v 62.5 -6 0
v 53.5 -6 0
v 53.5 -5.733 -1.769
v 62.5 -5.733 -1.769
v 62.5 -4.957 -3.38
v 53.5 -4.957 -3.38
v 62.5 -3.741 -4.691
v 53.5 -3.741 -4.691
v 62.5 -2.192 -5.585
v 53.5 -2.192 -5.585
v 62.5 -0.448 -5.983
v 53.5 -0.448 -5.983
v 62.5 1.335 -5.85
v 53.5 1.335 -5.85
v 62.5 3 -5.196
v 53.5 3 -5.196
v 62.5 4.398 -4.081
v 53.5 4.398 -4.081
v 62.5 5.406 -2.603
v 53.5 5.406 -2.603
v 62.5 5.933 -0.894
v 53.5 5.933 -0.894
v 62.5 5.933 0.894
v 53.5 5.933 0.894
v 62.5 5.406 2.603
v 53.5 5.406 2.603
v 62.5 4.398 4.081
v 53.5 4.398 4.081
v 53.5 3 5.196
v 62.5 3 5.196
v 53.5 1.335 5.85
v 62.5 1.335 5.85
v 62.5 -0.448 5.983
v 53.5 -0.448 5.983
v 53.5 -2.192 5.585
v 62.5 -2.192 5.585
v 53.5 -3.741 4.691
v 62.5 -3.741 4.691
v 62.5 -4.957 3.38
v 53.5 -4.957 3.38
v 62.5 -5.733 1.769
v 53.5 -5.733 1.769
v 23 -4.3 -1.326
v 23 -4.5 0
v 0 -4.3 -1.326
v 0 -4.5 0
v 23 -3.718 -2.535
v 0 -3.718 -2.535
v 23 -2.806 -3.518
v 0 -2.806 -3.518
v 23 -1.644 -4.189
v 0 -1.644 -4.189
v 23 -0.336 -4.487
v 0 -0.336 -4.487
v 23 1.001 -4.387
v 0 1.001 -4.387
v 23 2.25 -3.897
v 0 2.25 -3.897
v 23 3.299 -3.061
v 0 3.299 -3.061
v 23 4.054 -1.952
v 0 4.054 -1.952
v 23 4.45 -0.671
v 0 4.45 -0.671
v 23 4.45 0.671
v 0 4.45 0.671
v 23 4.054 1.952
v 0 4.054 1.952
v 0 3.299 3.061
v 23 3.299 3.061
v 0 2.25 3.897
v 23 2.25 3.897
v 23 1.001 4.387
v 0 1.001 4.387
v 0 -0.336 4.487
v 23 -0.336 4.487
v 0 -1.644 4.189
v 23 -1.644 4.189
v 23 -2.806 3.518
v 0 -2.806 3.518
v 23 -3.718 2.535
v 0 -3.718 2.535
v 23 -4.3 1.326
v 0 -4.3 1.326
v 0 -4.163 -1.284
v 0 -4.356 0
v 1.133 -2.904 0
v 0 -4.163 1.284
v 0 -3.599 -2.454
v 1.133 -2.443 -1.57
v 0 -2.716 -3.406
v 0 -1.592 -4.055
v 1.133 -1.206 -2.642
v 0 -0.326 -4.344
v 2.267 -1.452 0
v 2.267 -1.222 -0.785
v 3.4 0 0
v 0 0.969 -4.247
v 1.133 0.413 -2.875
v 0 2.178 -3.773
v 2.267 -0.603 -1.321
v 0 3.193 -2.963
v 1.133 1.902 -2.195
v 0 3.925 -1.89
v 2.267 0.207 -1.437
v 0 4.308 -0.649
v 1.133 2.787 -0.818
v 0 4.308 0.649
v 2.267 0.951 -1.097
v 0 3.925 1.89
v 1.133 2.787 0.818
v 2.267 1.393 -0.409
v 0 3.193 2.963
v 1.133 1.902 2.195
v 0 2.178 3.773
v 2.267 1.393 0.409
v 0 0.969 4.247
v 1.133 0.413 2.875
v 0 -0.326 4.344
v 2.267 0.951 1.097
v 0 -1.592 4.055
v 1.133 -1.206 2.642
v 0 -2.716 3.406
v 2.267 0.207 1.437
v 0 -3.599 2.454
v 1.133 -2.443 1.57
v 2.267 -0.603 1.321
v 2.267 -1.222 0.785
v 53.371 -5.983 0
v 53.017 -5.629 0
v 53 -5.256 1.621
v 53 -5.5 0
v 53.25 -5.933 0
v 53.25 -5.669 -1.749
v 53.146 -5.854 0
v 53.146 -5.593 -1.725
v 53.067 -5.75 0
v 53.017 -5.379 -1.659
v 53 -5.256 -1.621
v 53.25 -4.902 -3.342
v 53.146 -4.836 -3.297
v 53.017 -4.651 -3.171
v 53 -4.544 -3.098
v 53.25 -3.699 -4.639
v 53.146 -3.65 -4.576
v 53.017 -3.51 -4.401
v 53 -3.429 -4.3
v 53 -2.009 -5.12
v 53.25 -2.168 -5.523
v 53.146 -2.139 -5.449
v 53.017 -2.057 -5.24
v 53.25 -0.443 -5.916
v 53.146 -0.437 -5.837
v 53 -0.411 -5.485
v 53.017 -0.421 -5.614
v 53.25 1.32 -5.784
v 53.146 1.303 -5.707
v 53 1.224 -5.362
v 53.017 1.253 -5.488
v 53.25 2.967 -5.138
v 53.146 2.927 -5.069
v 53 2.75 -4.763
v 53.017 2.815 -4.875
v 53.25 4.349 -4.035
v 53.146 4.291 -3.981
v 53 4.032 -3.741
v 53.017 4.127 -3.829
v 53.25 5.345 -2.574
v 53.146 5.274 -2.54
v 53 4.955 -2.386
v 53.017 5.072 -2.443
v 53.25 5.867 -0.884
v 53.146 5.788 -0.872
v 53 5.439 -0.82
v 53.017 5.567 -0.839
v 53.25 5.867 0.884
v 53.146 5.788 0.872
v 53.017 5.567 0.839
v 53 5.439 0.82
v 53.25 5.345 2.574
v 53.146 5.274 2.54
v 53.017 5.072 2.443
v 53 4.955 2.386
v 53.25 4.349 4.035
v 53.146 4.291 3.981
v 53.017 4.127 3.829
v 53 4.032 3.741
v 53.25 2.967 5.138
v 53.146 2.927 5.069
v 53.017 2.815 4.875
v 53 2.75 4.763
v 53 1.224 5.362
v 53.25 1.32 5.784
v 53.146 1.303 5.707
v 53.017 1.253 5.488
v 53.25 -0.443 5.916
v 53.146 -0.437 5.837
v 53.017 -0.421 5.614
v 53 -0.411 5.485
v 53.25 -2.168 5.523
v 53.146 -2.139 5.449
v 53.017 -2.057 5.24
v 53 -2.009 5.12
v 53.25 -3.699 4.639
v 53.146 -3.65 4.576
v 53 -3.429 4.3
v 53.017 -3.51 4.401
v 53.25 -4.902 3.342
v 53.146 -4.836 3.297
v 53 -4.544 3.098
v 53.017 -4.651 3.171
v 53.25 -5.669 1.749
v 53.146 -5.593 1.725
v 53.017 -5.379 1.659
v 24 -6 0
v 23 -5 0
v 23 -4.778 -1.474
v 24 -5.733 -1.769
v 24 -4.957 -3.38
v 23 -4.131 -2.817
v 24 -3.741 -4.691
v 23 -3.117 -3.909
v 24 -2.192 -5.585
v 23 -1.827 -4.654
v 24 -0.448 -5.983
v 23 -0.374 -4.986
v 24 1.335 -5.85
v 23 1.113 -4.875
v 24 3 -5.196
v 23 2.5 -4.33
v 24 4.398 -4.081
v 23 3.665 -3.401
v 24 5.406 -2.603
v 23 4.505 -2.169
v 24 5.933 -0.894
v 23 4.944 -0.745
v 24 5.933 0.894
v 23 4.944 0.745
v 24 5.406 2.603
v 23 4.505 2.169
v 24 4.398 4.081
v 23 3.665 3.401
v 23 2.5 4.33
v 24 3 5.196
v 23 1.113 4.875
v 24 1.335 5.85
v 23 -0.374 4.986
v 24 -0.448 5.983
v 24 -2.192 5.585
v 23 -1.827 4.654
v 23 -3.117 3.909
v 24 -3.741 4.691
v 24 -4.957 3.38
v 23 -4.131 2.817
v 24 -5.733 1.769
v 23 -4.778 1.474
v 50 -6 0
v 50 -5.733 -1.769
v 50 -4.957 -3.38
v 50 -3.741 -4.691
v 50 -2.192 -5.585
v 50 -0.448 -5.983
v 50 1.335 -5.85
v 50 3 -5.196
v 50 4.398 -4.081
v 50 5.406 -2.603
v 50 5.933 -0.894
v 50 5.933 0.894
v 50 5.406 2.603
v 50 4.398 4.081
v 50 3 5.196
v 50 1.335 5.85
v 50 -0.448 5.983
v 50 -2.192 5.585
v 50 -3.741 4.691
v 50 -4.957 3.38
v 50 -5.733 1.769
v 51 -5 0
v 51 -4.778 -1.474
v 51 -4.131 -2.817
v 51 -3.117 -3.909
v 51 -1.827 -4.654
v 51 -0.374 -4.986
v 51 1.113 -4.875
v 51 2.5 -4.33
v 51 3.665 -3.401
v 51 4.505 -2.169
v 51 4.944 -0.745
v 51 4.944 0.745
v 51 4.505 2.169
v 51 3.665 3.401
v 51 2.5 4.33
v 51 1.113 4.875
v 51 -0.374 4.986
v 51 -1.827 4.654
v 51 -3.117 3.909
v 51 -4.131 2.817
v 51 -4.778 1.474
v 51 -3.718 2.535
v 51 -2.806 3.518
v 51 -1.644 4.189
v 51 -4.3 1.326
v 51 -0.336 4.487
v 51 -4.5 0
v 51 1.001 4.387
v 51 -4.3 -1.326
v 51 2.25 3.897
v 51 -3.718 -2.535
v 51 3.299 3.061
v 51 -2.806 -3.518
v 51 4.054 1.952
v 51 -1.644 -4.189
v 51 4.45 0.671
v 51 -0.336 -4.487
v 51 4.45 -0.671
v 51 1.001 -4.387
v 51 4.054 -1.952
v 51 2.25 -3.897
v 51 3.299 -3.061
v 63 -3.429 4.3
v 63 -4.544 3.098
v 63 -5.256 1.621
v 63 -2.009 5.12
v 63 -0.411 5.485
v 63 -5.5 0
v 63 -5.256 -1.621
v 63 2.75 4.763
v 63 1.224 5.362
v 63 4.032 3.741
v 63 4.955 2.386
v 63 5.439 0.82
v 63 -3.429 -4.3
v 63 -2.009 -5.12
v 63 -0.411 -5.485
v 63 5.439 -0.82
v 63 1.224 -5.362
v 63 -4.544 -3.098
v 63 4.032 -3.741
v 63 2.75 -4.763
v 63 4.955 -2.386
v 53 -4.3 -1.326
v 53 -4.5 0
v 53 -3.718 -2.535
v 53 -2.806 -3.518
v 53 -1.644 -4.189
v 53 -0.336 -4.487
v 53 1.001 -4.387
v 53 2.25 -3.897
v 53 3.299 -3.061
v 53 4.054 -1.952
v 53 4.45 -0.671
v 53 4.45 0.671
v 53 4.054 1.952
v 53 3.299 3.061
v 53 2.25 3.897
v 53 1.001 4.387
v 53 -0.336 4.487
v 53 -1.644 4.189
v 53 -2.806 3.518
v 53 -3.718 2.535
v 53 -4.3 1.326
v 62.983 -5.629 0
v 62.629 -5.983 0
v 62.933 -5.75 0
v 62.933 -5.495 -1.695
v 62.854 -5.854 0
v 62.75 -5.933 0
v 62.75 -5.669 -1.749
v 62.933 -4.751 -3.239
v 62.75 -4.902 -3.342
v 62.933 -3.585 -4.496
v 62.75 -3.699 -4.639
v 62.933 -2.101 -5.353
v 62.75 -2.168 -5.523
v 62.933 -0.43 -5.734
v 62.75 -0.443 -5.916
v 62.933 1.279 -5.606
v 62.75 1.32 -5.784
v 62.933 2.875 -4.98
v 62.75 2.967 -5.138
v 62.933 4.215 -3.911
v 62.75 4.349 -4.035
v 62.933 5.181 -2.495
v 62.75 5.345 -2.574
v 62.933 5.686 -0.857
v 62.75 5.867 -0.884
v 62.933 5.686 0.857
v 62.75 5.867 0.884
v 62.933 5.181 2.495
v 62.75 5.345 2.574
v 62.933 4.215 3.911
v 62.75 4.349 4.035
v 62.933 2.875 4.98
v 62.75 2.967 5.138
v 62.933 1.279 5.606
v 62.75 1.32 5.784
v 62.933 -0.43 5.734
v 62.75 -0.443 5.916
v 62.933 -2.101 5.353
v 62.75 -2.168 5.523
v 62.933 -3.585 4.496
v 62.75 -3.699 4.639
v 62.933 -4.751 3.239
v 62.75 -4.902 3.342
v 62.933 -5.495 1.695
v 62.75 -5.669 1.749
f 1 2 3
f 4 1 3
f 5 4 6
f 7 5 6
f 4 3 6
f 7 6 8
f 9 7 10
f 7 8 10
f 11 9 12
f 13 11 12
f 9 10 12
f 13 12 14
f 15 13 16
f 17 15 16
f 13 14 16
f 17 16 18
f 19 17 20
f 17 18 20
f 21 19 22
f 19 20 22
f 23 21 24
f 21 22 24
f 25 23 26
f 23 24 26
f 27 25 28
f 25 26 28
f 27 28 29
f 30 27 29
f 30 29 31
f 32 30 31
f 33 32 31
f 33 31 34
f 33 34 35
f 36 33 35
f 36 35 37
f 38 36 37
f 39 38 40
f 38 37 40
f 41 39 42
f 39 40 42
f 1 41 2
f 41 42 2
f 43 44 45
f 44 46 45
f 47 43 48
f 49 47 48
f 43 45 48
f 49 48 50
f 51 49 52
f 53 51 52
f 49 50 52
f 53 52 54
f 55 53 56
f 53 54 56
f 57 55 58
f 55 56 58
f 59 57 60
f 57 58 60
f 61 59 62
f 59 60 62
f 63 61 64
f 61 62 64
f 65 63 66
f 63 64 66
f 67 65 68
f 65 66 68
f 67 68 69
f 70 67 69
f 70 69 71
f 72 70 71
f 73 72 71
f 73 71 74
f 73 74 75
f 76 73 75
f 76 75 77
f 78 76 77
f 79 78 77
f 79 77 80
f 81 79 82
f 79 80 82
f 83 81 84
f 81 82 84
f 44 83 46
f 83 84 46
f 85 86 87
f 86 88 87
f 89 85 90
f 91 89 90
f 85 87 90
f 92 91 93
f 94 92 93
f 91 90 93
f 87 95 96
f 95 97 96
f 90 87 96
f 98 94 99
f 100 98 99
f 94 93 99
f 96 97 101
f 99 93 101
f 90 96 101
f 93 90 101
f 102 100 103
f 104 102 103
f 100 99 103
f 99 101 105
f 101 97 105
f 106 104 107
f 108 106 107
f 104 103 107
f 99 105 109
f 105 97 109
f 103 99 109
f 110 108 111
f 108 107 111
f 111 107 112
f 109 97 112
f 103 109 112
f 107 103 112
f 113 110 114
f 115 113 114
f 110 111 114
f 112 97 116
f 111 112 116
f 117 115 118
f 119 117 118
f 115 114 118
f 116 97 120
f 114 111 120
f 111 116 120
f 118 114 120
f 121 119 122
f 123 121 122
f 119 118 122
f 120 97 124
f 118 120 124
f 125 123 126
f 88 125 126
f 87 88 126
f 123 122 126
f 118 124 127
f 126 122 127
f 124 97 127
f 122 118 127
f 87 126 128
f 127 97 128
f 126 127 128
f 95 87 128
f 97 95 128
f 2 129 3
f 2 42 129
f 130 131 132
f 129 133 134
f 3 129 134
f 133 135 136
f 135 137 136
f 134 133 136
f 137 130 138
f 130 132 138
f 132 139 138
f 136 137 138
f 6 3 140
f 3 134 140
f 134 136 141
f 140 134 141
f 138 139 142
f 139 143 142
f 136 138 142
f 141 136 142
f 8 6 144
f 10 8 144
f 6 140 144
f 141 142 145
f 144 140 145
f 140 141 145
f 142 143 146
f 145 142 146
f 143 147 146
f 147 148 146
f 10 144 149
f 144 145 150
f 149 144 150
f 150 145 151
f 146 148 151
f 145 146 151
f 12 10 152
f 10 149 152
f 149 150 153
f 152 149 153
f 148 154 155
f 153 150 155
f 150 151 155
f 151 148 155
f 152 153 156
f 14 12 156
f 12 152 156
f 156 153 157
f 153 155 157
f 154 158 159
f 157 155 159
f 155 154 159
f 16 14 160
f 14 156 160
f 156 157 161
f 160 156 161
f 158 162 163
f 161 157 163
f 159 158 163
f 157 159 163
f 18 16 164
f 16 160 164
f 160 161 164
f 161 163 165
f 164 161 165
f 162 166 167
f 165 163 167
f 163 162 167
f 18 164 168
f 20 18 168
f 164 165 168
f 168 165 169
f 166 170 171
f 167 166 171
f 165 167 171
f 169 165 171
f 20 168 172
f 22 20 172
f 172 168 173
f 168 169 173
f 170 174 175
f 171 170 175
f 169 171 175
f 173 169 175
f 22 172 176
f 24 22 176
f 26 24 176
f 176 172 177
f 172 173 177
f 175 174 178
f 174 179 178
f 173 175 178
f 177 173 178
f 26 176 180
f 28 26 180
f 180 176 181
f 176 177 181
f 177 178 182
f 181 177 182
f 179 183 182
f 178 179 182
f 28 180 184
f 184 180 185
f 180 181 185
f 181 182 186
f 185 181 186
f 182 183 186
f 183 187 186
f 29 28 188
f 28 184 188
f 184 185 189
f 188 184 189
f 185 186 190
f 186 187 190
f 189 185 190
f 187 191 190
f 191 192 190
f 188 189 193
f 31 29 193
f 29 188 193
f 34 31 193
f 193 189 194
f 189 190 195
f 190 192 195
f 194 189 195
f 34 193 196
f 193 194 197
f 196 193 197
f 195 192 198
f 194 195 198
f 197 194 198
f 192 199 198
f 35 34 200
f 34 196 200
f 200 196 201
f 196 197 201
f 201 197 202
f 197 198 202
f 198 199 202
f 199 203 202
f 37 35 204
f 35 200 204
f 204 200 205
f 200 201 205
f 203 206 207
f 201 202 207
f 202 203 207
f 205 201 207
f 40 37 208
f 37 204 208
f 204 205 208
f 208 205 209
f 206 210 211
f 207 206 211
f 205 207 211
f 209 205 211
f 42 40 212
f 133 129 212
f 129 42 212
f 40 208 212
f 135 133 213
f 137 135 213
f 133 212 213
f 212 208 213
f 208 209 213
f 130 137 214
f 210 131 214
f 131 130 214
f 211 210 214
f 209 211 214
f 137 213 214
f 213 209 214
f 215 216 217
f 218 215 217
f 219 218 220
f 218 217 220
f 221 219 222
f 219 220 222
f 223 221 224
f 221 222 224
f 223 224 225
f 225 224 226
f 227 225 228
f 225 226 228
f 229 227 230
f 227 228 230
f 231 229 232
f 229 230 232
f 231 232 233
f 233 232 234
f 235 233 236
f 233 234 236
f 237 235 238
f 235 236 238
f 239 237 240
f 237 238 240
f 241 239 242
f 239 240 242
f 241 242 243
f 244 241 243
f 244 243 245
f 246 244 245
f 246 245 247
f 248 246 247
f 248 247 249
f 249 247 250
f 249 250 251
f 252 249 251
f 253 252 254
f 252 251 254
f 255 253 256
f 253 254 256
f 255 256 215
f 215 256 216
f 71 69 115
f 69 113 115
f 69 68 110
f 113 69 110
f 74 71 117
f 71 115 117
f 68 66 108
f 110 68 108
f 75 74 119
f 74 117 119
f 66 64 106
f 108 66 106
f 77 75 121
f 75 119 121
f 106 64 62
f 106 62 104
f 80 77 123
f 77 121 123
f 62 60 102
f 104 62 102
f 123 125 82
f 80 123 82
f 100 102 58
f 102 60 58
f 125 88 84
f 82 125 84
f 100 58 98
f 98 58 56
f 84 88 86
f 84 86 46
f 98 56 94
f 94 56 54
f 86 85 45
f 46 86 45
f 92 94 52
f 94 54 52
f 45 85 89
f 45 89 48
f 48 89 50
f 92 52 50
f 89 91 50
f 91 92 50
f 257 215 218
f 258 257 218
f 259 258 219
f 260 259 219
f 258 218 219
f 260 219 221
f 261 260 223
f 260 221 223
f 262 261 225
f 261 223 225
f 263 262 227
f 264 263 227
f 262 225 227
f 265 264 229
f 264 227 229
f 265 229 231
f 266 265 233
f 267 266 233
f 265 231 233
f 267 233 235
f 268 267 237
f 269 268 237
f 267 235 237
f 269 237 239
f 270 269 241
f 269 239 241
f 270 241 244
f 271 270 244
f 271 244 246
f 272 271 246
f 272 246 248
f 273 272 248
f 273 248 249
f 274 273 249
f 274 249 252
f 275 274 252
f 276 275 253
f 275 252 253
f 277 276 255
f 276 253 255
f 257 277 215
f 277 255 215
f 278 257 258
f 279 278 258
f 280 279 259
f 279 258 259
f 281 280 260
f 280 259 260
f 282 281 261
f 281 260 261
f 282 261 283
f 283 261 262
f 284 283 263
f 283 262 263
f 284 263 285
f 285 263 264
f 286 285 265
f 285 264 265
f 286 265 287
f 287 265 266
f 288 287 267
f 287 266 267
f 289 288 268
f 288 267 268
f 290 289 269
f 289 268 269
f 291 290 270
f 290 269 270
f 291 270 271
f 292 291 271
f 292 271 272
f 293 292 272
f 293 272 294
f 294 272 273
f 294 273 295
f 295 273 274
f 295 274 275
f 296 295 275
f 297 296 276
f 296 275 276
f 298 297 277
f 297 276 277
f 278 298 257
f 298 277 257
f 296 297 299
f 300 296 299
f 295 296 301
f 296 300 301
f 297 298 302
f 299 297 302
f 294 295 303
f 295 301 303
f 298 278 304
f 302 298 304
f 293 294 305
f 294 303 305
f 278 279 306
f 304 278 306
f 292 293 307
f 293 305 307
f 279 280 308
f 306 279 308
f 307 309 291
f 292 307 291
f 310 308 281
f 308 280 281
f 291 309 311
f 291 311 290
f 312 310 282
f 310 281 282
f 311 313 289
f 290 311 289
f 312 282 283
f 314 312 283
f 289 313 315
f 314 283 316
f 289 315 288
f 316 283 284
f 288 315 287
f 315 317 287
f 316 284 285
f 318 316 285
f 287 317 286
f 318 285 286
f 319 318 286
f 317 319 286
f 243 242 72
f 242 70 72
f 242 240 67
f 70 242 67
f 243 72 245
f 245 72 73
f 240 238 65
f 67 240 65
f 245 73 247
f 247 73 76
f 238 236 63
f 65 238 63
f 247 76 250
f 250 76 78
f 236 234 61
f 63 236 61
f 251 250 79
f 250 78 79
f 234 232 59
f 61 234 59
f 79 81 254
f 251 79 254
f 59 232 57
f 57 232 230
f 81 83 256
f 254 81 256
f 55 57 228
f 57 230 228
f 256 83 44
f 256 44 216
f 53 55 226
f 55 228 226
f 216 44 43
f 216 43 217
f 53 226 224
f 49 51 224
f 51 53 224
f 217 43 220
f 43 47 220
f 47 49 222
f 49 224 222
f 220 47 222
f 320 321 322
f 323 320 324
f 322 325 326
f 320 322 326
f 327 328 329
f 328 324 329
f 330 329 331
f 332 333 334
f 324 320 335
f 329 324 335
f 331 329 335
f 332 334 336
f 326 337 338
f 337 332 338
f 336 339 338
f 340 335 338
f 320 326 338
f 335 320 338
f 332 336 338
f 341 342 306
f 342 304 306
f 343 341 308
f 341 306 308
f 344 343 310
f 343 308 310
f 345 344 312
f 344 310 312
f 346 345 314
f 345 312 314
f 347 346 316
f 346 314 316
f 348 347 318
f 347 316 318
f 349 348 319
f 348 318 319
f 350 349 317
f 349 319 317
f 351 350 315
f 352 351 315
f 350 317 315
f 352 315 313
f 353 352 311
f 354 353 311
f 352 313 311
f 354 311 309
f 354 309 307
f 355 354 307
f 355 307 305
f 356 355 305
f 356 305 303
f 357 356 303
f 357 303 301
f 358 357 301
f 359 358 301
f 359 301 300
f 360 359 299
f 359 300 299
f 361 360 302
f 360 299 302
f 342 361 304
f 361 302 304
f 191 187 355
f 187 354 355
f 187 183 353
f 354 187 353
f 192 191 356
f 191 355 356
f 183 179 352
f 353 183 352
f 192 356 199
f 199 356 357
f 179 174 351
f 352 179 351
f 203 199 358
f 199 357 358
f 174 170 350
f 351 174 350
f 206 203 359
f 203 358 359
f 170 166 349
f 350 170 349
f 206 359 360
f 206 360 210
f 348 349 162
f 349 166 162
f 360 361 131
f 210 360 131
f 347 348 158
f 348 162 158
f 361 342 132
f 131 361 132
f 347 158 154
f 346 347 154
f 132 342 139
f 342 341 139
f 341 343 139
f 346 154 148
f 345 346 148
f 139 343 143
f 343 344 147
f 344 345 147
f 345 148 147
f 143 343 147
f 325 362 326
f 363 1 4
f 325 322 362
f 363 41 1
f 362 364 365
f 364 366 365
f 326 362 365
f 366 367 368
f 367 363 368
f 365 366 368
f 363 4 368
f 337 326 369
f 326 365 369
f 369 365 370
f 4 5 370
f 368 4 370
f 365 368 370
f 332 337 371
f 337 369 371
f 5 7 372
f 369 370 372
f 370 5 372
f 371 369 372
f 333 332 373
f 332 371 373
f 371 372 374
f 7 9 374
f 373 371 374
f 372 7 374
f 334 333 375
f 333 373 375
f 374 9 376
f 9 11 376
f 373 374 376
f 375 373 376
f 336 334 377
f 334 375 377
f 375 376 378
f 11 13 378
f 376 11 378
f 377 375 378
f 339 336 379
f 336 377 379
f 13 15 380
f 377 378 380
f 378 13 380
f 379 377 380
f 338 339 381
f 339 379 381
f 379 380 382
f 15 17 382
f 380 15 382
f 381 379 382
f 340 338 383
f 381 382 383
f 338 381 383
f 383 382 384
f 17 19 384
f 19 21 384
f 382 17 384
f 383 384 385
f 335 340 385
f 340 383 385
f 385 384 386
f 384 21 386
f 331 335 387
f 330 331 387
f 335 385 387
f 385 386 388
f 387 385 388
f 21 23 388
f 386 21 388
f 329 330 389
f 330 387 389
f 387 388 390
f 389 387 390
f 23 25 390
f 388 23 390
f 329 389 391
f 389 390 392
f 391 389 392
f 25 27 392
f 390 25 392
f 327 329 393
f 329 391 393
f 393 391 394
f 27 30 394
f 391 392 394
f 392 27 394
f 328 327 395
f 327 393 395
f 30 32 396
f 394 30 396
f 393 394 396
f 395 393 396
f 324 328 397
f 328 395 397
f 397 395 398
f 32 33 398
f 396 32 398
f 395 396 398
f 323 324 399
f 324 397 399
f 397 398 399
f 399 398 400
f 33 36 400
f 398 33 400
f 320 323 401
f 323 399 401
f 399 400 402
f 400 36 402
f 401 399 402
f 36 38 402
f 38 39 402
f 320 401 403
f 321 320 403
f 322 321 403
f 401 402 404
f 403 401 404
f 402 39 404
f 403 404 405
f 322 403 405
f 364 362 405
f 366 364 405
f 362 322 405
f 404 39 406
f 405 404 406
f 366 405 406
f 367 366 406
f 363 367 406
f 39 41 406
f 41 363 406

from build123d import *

# Parameters (mm, degrees)
FILETE1_R     = 0.5
CHANFRO1_SIZE = 1


with BuildPart() as part:
    # Esboço1 → Revolução1 (revolve)
    with BuildSketch(Plane.XY, mode=Mode.PRIVATE) as revolu_o1_sk:
        Polygon((3.39980648, 0), (63, 0), (63, 6), (53, 6), (53, 4.5), (51, 4.5), (51, 6), (23, 6), (23, 4.5), (0, 4.5), (0, 4.356416698), align=None)
    revolve(revolu_o1_sk.sketch.rotate(Axis((3.39980648, 0, 0), (1, 0, 0)), 180), axis=Axis((3.39980648, 0, 0), (1, 0, 0)))

    # Filete1
    filete1_edges = [part.edges().sort_by_distance(p)[0] for p in [
        (53, 6, 0),
        (63, 6, 0),
    ]]
    fillet(filete1_edges, radius=FILETE1_R)

    # Chanfro1
    chanfro1_edges = [part.edges().sort_by_distance(p)[0] for p in [
        (51, 6, 0),
        (23, 6, 0),
    ]]
    chamfer(chanfro1_edges, length=CHANFRO1_SIZE)


solid = part.part
